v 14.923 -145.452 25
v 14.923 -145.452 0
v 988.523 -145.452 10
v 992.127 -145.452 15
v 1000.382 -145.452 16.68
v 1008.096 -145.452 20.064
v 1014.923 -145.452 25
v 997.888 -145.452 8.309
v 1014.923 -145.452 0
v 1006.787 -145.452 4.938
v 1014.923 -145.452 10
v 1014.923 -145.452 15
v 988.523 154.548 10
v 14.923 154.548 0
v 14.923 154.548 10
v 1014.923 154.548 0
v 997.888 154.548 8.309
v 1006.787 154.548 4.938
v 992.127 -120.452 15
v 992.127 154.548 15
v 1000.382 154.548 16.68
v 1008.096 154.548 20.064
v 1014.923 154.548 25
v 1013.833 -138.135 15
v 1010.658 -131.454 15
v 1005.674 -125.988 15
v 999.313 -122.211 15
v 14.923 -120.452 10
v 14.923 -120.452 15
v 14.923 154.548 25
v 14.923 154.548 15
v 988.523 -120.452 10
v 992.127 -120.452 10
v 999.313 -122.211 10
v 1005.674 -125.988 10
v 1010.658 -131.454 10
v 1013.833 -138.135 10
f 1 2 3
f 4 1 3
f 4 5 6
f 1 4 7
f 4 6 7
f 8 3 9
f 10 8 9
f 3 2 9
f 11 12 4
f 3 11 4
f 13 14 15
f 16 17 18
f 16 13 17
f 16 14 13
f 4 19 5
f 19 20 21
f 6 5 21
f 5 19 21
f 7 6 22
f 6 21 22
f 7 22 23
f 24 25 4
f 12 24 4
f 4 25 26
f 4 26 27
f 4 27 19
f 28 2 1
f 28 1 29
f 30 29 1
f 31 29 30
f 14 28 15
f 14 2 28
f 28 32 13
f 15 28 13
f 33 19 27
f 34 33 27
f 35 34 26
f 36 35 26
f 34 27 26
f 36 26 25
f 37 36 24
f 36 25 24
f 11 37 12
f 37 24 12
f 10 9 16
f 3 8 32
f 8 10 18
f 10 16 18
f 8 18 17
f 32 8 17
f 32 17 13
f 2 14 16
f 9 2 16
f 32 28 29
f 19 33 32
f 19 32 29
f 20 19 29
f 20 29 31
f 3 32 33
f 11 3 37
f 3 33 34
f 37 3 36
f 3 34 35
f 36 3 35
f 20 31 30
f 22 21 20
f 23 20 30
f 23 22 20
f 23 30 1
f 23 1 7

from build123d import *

# Parameters (mm, degrees)
F0_W     = 1000
F0_H     = 300
F1_DEPTH = 25
F2_W     = 275
F2_H     = 5
F3_DEPTH = 1000.001
F5_DEPTH = 300.001
F7_DEPTH = 300.001
F9_DEPTH = 5


with BuildPart() as f1:
    # F0 (on Top) → F1 (new body)
    with BuildSketch(Plane.XY):
        with Locations((514.9225434339, 4.54775244)):
            Rectangle(F0_W, F0_H)
    extrude(amount=F1_DEPTH)

    # F2 (on face) → F3 (cut, through all)
    with BuildSketch(Plane.YZ.offset(1014.9225434339)):
        with Locations((17.04775244, 12.5)):
            Rectangle(F2_W, F2_H)
    extrude(amount=-F3_DEPTH, mode=Mode.SUBTRACT)

    # F4 (on face) → F5 (cut, through all)
    with BuildSketch(Plane(origin=(0, 154.54775244, 0), x_dir=(-1, 0, 0), z_dir=(0, 1, 0))):
        with BuildLine():
            ThreePointArc((-992.1274558663, 15), (-1004.3292812217, 18.1666331145), (-1014.9225434339, 25))
            Line((-1014.9225434339, 25), (-1014.9225434339, 15))
            Line((-1014.9225434339, 15), (-992.1274558663, 15))
        make_face()
    extrude(amount=-F5_DEPTH, mode=Mode.SUBTRACT)

    # F6 (on face) → F7 (cut, through all)
    with BuildSketch(Plane(origin=(0, 154.54775244, 0), x_dir=(-1, 0, 0), z_dir=(0, 1, 0))):
        with BuildLine():
            ThreePointArc((-1014.9225434339, 0), (-1002.414847544, 6.8277253985), (-988.5225128069, 10))
            Line((-988.5225128069, 10), (-1014.9225434339, 10))
            Line((-1014.9225434339, 10), (-1014.9225434339, 0))
        make_face()
    extrude(amount=-F7_DEPTH, mode=Mode.SUBTRACT)

    # F8 (on face) → F9 (cut)
    with BuildSketch(Plane.XY.offset(15)):
        with BuildLine():
            ThreePointArc((992.1274558663, -120.45224756), (1008.3682439808, -128.5361604148), (1014.9225434339, -145.45224756))
            Line((1014.9225434339, -145.45224756), (1014.9225434339, -120.45224756))
            Line((1014.9225434339, -120.45224756), (992.1274558663, -120.45224756))
        make_face()
    extrude(amount=-F9_DEPTH, mode=Mode.SUBTRACT)


solid = f1.part
